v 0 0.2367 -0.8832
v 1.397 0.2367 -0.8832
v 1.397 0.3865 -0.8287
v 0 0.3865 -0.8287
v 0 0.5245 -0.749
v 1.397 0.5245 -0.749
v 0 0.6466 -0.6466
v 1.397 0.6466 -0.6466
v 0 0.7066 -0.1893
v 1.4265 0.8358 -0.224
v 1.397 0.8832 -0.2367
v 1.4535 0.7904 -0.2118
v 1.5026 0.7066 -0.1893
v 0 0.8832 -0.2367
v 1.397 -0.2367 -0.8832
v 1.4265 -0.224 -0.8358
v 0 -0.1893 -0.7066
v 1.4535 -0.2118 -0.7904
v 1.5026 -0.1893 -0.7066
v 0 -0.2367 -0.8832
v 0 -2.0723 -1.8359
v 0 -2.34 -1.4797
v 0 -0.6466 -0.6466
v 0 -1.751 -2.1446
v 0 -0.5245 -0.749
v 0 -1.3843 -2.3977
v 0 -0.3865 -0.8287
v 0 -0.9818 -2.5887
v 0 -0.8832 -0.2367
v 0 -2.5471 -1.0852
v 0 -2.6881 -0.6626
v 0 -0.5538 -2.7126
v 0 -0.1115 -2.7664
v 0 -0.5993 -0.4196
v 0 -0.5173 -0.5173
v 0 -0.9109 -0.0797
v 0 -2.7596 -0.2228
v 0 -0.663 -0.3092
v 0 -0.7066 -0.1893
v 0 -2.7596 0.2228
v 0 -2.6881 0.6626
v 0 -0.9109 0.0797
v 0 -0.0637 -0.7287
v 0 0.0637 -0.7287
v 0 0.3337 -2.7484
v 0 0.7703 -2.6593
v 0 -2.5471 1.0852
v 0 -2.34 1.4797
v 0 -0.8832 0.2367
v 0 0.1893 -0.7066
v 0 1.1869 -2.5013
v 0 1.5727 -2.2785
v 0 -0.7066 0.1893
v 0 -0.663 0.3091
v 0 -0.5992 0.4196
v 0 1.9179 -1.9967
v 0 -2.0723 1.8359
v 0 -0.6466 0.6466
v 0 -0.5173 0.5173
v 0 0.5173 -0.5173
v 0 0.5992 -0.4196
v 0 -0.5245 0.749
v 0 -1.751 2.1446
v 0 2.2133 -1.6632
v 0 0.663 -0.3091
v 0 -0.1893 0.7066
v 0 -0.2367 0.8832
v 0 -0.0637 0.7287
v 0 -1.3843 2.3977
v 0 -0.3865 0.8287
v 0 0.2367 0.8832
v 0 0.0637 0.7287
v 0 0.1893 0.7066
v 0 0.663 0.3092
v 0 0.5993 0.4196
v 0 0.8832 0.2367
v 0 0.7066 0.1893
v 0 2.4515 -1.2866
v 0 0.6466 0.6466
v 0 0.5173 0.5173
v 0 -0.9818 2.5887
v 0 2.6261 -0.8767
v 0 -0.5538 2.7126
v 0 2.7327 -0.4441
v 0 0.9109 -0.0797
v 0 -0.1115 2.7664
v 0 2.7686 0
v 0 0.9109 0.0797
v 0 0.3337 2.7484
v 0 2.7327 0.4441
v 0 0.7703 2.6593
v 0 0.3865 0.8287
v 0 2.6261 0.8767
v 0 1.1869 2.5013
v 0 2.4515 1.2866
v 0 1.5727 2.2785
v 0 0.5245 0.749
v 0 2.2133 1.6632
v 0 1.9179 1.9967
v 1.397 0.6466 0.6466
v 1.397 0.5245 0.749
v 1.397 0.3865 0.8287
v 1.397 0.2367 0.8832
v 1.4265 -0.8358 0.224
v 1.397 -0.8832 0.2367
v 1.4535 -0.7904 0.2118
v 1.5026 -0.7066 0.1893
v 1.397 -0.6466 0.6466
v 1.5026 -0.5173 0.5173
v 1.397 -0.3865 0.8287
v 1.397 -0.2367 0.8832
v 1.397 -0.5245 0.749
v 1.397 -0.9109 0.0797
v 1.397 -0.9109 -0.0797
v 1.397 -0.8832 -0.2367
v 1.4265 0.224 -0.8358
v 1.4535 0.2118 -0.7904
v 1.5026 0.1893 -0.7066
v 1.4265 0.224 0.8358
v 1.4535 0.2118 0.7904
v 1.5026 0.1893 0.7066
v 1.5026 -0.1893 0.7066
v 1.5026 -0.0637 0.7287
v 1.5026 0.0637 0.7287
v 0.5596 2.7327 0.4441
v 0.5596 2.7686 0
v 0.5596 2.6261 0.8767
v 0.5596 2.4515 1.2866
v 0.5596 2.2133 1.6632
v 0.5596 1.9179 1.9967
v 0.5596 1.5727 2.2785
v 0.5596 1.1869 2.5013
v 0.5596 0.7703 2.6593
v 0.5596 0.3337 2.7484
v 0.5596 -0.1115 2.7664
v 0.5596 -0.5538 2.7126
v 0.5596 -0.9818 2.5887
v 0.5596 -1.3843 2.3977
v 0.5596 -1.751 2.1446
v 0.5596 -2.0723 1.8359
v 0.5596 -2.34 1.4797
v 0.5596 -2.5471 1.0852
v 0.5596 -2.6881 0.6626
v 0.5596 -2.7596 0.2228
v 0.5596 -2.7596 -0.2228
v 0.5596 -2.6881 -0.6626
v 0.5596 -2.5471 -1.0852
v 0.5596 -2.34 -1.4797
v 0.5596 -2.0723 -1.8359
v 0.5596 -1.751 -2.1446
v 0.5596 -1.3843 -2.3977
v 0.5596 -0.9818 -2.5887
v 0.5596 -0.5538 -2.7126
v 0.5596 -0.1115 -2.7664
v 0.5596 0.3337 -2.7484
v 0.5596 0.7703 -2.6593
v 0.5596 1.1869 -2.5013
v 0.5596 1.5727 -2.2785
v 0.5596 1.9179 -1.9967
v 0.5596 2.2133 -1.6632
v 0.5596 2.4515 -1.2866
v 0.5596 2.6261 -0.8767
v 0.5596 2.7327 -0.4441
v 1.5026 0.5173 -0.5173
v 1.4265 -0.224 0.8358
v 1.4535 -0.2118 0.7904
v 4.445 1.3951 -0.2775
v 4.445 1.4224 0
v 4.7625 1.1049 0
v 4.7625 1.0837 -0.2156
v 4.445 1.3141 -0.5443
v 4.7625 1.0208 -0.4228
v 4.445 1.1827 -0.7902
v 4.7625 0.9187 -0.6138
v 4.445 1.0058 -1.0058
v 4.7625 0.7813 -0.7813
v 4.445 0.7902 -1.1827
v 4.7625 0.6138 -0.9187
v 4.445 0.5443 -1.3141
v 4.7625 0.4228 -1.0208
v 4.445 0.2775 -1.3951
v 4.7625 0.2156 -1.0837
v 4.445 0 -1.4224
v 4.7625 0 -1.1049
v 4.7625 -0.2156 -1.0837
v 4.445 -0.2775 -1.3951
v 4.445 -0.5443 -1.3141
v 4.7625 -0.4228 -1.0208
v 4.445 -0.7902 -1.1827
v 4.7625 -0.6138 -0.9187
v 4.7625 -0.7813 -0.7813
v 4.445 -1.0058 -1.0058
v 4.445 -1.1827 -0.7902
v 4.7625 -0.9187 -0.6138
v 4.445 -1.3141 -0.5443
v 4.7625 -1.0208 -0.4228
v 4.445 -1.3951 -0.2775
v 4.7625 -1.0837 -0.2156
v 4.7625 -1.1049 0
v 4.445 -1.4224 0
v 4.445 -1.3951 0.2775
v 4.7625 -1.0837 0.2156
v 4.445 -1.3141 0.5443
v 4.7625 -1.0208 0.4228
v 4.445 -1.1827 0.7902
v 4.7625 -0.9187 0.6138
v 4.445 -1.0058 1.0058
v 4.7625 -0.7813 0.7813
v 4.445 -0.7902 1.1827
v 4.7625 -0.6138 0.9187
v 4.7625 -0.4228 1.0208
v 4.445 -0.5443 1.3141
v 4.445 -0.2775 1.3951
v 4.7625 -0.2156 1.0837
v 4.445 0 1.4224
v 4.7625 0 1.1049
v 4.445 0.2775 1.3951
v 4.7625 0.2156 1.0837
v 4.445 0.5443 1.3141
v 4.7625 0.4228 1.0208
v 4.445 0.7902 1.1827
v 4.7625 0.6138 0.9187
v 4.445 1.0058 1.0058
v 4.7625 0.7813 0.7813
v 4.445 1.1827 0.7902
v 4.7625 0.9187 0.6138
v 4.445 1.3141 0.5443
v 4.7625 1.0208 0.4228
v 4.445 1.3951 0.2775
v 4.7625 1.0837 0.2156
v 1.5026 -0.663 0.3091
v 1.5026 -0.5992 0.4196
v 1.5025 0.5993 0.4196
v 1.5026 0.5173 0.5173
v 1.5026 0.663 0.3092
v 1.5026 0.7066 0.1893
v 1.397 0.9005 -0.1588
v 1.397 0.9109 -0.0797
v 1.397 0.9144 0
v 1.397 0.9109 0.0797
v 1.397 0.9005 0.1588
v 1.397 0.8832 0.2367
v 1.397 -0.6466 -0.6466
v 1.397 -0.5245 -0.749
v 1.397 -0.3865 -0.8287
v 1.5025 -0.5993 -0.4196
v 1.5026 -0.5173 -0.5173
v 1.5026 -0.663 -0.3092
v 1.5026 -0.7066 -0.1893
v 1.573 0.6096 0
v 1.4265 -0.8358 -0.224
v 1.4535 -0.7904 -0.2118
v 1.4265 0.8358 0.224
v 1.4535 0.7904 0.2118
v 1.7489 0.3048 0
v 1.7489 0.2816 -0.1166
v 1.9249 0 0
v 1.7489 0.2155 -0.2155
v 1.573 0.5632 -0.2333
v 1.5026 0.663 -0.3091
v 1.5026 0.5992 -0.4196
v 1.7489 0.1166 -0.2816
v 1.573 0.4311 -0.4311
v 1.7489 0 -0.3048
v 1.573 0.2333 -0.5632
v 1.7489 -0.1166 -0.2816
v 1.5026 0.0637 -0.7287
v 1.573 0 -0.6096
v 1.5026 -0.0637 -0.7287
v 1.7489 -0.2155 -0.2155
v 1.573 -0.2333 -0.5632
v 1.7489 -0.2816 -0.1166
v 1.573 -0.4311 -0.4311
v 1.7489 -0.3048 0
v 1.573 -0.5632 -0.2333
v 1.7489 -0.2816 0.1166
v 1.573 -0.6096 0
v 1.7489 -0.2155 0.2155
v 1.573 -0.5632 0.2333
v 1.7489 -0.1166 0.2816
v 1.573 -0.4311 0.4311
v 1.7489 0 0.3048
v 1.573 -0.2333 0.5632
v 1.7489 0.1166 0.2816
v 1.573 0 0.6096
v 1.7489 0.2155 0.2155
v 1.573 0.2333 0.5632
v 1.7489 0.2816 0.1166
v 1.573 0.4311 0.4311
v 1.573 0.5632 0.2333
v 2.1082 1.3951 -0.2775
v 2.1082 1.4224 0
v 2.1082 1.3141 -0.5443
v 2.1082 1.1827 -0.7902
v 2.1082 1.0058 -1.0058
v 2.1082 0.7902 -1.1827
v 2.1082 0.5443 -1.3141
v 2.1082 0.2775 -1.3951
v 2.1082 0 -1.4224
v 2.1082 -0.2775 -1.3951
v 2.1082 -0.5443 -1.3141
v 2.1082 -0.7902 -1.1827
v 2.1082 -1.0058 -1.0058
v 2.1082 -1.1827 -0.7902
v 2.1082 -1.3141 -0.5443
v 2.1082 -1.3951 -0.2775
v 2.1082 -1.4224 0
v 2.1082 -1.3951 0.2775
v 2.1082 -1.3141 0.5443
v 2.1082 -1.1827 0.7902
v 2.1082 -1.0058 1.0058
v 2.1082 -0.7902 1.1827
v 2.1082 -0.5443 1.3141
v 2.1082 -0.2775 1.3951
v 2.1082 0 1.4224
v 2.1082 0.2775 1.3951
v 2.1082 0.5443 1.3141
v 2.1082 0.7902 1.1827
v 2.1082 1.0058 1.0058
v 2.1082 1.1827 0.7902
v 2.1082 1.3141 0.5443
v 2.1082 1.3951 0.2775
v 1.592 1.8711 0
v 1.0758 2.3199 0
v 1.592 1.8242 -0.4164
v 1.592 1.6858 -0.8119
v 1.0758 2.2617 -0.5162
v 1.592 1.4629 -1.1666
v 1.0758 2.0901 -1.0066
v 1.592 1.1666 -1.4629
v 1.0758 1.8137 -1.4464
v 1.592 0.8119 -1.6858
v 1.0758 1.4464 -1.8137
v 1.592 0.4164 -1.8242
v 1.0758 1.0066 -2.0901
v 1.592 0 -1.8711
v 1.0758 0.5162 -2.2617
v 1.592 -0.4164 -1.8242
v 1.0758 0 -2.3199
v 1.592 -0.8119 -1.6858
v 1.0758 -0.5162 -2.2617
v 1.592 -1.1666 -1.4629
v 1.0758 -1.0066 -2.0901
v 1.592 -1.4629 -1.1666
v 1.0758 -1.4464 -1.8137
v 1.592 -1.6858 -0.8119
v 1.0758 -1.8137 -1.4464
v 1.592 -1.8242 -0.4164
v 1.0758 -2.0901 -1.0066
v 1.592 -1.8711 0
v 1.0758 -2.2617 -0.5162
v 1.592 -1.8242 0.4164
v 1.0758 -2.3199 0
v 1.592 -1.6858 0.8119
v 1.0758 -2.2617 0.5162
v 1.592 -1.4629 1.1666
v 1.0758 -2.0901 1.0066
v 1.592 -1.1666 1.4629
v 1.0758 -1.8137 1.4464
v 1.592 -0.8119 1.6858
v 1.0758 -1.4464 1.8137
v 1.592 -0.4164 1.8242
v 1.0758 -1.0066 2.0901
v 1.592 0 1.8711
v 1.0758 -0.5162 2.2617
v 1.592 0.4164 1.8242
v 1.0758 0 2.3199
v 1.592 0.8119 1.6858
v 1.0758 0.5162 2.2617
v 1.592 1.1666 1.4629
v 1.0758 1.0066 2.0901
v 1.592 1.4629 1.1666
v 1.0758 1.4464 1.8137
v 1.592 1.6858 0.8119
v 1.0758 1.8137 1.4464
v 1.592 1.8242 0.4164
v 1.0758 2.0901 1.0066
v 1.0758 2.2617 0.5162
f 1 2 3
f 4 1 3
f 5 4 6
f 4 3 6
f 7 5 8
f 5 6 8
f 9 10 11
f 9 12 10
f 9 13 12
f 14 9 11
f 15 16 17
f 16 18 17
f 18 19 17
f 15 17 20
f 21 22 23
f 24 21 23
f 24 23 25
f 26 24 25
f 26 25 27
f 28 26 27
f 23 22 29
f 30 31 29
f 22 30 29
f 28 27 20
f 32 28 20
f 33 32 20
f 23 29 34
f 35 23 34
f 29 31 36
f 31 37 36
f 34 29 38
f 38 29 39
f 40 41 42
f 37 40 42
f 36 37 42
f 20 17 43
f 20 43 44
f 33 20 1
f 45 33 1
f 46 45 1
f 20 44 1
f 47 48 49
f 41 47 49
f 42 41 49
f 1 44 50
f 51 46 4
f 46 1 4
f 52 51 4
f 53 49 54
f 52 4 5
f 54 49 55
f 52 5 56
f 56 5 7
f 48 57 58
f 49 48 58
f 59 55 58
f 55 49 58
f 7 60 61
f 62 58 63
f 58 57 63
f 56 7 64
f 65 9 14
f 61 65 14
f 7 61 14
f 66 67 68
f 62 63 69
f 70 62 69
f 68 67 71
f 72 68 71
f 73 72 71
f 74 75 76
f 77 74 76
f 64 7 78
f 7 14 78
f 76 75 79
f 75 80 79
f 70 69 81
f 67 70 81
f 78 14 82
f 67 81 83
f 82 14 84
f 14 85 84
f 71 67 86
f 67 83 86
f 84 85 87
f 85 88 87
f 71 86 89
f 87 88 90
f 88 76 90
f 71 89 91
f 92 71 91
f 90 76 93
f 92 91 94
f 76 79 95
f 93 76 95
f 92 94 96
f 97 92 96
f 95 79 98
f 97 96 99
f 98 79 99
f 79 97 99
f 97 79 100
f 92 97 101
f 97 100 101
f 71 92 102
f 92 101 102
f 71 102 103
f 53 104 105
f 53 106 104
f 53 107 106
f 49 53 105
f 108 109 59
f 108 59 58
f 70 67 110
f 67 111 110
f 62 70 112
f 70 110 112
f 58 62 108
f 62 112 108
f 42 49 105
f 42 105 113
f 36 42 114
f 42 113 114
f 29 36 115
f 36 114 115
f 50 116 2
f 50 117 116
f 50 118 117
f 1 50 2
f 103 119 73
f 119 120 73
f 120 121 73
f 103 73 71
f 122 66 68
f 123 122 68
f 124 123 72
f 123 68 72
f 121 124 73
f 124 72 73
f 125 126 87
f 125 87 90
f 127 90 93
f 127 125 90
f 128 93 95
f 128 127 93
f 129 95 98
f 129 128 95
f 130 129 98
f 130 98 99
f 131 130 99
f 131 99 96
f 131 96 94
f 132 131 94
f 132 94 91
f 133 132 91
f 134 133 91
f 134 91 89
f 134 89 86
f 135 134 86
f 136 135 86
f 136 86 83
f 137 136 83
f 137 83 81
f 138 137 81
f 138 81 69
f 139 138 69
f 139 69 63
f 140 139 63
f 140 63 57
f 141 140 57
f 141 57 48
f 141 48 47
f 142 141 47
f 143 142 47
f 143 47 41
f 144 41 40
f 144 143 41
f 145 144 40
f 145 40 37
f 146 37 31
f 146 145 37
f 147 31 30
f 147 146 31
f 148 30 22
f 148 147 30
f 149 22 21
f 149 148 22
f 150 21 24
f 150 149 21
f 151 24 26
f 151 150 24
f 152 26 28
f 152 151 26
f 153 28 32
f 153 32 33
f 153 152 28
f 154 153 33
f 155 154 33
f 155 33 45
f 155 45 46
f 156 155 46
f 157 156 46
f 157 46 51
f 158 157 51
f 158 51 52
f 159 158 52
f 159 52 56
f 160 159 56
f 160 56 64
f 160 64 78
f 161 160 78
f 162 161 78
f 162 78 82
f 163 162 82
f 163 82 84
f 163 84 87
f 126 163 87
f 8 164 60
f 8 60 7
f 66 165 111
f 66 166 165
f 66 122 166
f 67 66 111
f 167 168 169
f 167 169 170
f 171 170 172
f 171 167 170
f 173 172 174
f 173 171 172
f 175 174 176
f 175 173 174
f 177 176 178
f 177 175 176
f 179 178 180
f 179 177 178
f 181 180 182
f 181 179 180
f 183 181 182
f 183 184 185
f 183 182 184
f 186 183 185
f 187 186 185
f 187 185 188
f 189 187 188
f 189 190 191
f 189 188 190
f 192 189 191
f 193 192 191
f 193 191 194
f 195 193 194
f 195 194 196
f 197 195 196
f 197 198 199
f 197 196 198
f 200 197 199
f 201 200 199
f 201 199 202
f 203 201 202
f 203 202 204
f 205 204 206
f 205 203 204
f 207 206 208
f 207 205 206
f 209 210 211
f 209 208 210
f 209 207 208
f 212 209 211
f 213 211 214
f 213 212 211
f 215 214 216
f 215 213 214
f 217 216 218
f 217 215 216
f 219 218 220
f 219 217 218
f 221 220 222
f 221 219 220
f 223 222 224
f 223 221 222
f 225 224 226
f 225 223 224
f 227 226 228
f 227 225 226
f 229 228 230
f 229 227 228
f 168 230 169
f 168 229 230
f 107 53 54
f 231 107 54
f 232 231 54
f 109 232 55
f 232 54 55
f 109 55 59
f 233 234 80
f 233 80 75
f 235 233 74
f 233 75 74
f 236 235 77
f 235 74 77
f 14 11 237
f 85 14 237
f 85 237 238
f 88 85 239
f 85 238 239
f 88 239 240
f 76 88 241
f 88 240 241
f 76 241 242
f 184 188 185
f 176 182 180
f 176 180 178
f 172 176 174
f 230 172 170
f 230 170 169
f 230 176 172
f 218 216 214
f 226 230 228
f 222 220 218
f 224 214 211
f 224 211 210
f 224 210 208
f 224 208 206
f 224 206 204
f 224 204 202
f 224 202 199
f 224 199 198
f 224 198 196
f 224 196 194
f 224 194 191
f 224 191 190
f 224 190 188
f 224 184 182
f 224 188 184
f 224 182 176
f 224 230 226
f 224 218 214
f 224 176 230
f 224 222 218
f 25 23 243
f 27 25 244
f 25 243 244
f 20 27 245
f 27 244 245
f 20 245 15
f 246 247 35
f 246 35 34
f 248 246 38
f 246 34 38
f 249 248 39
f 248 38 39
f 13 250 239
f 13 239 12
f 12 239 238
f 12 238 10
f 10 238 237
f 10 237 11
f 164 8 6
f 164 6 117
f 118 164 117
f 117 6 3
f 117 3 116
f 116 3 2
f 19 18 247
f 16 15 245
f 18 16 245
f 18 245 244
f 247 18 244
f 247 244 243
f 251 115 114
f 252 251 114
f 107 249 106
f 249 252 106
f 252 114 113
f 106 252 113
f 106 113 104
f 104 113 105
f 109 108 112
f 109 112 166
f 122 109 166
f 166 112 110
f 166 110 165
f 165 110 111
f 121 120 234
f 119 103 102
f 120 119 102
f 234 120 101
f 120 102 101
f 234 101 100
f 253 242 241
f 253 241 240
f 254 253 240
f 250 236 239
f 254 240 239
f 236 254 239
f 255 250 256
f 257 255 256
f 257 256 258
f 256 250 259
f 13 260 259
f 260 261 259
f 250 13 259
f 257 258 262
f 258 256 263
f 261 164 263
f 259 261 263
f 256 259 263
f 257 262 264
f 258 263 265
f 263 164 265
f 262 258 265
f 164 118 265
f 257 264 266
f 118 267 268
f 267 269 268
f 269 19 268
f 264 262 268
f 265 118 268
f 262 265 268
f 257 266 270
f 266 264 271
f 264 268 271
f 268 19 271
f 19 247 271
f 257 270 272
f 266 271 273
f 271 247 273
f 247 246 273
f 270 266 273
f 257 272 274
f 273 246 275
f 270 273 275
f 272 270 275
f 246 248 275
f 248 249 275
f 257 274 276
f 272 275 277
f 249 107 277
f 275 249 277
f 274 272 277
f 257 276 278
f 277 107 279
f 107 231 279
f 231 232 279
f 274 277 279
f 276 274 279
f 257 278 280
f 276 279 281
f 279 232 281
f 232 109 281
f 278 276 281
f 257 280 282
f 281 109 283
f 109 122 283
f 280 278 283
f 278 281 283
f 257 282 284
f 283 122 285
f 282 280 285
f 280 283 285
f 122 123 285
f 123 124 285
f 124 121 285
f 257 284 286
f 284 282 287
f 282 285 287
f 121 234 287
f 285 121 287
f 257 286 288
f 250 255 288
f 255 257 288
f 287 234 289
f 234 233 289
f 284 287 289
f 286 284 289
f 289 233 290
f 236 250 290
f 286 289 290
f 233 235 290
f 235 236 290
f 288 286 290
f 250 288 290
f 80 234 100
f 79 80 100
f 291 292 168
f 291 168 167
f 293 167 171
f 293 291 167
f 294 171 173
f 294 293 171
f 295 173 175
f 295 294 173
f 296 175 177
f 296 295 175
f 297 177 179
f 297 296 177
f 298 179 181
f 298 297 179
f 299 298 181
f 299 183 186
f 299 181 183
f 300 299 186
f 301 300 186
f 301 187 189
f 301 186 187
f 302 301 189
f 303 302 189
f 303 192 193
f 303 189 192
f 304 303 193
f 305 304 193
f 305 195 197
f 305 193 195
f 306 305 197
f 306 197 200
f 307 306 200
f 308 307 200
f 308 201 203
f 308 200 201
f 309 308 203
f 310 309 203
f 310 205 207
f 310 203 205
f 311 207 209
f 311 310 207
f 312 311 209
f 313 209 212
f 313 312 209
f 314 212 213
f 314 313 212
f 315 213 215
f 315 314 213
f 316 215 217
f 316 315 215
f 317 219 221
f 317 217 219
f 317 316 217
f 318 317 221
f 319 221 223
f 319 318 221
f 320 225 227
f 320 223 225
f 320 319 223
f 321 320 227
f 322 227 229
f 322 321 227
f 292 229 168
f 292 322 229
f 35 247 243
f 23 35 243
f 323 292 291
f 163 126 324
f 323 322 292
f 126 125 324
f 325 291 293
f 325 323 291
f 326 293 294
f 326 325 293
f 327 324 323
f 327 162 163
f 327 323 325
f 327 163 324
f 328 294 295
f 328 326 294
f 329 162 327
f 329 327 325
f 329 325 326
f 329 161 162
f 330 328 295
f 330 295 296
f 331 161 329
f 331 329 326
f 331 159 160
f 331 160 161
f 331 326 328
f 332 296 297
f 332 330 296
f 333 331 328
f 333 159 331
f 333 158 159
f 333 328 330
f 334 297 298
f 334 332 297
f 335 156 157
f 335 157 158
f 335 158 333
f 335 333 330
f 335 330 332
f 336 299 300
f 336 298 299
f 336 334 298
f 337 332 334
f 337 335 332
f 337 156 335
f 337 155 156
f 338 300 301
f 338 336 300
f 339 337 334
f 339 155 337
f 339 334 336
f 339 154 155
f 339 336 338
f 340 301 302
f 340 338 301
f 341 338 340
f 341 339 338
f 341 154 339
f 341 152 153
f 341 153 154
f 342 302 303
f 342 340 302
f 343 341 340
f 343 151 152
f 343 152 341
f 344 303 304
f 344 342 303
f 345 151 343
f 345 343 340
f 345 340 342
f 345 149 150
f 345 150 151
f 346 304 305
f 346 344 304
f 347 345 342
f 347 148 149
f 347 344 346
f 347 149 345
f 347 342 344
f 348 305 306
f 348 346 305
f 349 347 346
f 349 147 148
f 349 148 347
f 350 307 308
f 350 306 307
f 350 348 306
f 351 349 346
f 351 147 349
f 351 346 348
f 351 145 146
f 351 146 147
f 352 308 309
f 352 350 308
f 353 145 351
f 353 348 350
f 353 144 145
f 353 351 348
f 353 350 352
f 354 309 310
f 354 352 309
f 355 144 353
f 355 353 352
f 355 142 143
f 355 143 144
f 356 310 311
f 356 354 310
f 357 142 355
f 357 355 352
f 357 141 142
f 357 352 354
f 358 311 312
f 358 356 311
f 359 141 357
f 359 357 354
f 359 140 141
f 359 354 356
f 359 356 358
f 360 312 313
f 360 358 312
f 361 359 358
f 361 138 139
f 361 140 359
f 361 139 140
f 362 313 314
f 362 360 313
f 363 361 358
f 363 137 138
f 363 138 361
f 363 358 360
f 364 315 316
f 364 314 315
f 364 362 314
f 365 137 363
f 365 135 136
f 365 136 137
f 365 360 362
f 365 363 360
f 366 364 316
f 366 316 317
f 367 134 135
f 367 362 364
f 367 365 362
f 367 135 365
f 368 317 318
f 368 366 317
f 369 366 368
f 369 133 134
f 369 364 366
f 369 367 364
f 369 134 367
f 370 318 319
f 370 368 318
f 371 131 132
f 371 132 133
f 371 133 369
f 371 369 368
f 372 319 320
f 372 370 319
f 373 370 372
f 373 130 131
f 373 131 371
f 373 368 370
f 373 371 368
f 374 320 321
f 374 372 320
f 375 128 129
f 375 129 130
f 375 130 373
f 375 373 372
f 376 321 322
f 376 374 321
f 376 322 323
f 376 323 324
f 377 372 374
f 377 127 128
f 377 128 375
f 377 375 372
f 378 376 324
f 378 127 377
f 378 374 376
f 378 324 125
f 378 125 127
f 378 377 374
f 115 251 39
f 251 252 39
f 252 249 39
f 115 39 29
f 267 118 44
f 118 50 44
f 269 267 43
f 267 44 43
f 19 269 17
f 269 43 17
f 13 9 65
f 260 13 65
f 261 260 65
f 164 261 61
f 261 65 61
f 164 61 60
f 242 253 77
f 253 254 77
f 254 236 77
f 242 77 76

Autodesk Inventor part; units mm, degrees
ref_plane "YZ Plane" through (0, 0, 0) normal (1, 0, 0) x (0, 1, 0)
ref_plane "XZ Plane" through (0, 0, 0) normal (0, 1, 0) x (-1, 0, 0)
sketch "Szkic1" plane through (0, 0, 0) normal (0, 0, 1) x (1, 0, 0)
  line L0 (4.7625, 0) -> (4.7625, 1.4224)
  line L1 (4.7625, 1.4224) -> (2.1082, 1.4224)
  line L2 (0, 2.7686) -> (0, 0.9144)
  line L3 (0, 0.9144) -> (1.397, 0.9144)
  line L4 (1.397, 0.9144) -> (1.9249, 0)
  line L5 (1.9249, 0) -> (4.7625, 0)
  line L6 (0, 2.7686) -> (0.5596, 2.7686)
  line L7 (0.5596, 2.7686) -> (2.1082, 1.4224)
  line L8 (-0.9525, 0) -> (5.715, 0) projected
  line L9 (0, -0.5537) -> (0, 3.3223) projected
  dimension "d0" = 4.7625
  dimension "d1" = 1.397
  dimension "d2" = 2.8448
  dimension "d3" = 2.1082
  dimension "d4" = 41
  dimension "d5" = 1.8288
  dimension "d6" = 60
  dimension "d7" = 5.5372
revolve "Bryła" add sketch "Szkic1" angle 360 about axis through (1.9249, 0, 0) along (1, 0, 0) contours L5 L4 L3 L2 L6 L7 L1 L0
sketch "Szkic2" plane through (0, 0, 0) normal (-1, 0, 0) x (0, 0, 1)
  circle A0 centre (0, 0) radius 2.7686 projected
  circle A1 centre (0, 0) radius 0.9144 projected
  line L0 (0.7066, 0.1893) -> (0.8832, 0.2367)
  line L1 (0.7066, -0.1893) -> (0.8832, -0.2367)
  arc A2 (0.7066, -0.1893) -> (0.7066, 0.1893) centre (0, 0) ccw
  arc A3 (0.8832, -0.2367) -> (0.8832, 0.2367) centre (0, 0) ccw
  line L2 (0, -3.876) -> (0, 3.876) projected
  line L3 (-3.876, 0) -> (3.876, 0) projected
  line L4 (0.7066, 0.1893) -> (0, 0) construction
  line L5 (0, 0) -> (0.7066, -0.1893) construction
  line L6 (0.1893, 0.7066) -> (0.2367, 0.8832)
  line L7 (0.5173, 0.5173) -> (0.6466, 0.6466)
  arc A4 (0.5173, 0.5173) -> (0.1893, 0.7066) centre (0, 0) ccw
  arc A5 (0.6466, 0.6466) -> (0.2367, 0.8832) centre (0, 0) ccw
  line L8 (-0.5173, 0.5173) -> (-0.6466, 0.6466)
  line L9 (-0.1893, 0.7066) -> (-0.2367, 0.8832)
  arc A6 (-0.1893, 0.7066) -> (-0.5173, 0.5173) centre (0, 0) ccw
  arc A7 (-0.2367, 0.8832) -> (-0.6466, 0.6466) centre (0, 0) ccw
  line L10 (-0.7066, -0.1893) -> (-0.8832, -0.2367)
  line L11 (-0.7066, 0.1893) -> (-0.8832, 0.2367)
  arc A8 (-0.7066, 0.1893) -> (-0.7066, -0.1893) centre (0, 0) ccw
  arc A9 (-0.8832, 0.2367) -> (-0.8832, -0.2367) centre (0, 0) ccw
  line L12 (-0.1893, -0.7066) -> (-0.2367, -0.8832)
  line L13 (-0.5173, -0.5173) -> (-0.6466, -0.6466)
  arc A10 (-0.5173, -0.5173) -> (-0.1893, -0.7066) centre (0, 0) ccw
  arc A11 (-0.6466, -0.6466) -> (-0.2367, -0.8832) centre (0, 0) ccw
  line L14 (0.5173, -0.5173) -> (0.6466, -0.6466)
  line L15 (0.1893, -0.7066) -> (0.2367, -0.8832)
  arc A12 (0.1893, -0.7066) -> (0.5173, -0.5173) centre (0, 0) ccw
  arc A13 (0.2367, -0.8832) -> (0.6466, -0.6466) centre (0, 0) ccw
  dimension "d8" = 1.463
  dimension "d9" = 1.8288
  dimension "d10" = 15
  dimension "d11" = 15
  dimension "d22" = 360
extrude "Szczelina" add sketch "Szkic2" against normal up to next contours L3 A2 L0 A1 | A1 L1 A2 L3 | L3 A8 L10 A1 | A1 L11 A8 L3 | A1 L7 A4 L6 | L9 A6 L8 A1 | A1 L13 A10 L12 | L15 A12 L14 A1
thread "Gwint" size "4-40 UNC" class "2A" standard "ANSI Unified Screw Threads" length 1.0668
chamfer "Faza1" distance 0.3175 distance2 0.3175 1 edges at (4.7625, -1.4224, 0) measured on face at (4.7625, -0.1427, 0.3949)
ref_plane "Work Plane1" through (66.6877, 0, 0) normal (0, 0, -1) x (1, 0, 0)
equation "\"d0\" = NLG"
equation "\"d1\" = INTI"
equation "\"d2\" = GD"
equation "\"d3\" = KOH"
equation "\"d4\" = 0.5 * SEWI"
equation "\"d5\" = SW"
equation "\"d7\" = KOD"
equation "\"d8\" = 0.8 * SW"
equation "\"d9\" = SW"
equation "\"d15\" = GEL"
equation "\"d17\" = -0.5 * SPD + 0.5 * GD"
equation "\"d18\" = GUL"
equation "\"NLG\" = 4.7625"
equation "\"SW\" = 1.8288"
equation "\"INTI\" = 1.397"
equation "\"GEL\" = 1.0668"
equation "\"KOH\" = 2.1082"
equation "\"KOD\" = 5.5372"
equation "\"GUL\" = 0.3175"
equation "\"SPD\" = 2.2098"
equation "\"GD\" = NND"
equation "\"SEWI\" = 82deg"
equation "\"TOA\" = 30deg"
equation "\"GD1\" = SPD"
equation "\"EPV\" = 3.80335"
equation "\"THREADDIA\" = 2.8448"
equation "\"BDM\" = NND"
equation "\"NND\" = 2.8448"
equation "\"GAL\" = 1.5875"
equation "\"E0\" = 1.155 * SW"
properties part number "ANSI B18.3 - 4-40 UNC x 0,1875" material "Stal, miękka"
